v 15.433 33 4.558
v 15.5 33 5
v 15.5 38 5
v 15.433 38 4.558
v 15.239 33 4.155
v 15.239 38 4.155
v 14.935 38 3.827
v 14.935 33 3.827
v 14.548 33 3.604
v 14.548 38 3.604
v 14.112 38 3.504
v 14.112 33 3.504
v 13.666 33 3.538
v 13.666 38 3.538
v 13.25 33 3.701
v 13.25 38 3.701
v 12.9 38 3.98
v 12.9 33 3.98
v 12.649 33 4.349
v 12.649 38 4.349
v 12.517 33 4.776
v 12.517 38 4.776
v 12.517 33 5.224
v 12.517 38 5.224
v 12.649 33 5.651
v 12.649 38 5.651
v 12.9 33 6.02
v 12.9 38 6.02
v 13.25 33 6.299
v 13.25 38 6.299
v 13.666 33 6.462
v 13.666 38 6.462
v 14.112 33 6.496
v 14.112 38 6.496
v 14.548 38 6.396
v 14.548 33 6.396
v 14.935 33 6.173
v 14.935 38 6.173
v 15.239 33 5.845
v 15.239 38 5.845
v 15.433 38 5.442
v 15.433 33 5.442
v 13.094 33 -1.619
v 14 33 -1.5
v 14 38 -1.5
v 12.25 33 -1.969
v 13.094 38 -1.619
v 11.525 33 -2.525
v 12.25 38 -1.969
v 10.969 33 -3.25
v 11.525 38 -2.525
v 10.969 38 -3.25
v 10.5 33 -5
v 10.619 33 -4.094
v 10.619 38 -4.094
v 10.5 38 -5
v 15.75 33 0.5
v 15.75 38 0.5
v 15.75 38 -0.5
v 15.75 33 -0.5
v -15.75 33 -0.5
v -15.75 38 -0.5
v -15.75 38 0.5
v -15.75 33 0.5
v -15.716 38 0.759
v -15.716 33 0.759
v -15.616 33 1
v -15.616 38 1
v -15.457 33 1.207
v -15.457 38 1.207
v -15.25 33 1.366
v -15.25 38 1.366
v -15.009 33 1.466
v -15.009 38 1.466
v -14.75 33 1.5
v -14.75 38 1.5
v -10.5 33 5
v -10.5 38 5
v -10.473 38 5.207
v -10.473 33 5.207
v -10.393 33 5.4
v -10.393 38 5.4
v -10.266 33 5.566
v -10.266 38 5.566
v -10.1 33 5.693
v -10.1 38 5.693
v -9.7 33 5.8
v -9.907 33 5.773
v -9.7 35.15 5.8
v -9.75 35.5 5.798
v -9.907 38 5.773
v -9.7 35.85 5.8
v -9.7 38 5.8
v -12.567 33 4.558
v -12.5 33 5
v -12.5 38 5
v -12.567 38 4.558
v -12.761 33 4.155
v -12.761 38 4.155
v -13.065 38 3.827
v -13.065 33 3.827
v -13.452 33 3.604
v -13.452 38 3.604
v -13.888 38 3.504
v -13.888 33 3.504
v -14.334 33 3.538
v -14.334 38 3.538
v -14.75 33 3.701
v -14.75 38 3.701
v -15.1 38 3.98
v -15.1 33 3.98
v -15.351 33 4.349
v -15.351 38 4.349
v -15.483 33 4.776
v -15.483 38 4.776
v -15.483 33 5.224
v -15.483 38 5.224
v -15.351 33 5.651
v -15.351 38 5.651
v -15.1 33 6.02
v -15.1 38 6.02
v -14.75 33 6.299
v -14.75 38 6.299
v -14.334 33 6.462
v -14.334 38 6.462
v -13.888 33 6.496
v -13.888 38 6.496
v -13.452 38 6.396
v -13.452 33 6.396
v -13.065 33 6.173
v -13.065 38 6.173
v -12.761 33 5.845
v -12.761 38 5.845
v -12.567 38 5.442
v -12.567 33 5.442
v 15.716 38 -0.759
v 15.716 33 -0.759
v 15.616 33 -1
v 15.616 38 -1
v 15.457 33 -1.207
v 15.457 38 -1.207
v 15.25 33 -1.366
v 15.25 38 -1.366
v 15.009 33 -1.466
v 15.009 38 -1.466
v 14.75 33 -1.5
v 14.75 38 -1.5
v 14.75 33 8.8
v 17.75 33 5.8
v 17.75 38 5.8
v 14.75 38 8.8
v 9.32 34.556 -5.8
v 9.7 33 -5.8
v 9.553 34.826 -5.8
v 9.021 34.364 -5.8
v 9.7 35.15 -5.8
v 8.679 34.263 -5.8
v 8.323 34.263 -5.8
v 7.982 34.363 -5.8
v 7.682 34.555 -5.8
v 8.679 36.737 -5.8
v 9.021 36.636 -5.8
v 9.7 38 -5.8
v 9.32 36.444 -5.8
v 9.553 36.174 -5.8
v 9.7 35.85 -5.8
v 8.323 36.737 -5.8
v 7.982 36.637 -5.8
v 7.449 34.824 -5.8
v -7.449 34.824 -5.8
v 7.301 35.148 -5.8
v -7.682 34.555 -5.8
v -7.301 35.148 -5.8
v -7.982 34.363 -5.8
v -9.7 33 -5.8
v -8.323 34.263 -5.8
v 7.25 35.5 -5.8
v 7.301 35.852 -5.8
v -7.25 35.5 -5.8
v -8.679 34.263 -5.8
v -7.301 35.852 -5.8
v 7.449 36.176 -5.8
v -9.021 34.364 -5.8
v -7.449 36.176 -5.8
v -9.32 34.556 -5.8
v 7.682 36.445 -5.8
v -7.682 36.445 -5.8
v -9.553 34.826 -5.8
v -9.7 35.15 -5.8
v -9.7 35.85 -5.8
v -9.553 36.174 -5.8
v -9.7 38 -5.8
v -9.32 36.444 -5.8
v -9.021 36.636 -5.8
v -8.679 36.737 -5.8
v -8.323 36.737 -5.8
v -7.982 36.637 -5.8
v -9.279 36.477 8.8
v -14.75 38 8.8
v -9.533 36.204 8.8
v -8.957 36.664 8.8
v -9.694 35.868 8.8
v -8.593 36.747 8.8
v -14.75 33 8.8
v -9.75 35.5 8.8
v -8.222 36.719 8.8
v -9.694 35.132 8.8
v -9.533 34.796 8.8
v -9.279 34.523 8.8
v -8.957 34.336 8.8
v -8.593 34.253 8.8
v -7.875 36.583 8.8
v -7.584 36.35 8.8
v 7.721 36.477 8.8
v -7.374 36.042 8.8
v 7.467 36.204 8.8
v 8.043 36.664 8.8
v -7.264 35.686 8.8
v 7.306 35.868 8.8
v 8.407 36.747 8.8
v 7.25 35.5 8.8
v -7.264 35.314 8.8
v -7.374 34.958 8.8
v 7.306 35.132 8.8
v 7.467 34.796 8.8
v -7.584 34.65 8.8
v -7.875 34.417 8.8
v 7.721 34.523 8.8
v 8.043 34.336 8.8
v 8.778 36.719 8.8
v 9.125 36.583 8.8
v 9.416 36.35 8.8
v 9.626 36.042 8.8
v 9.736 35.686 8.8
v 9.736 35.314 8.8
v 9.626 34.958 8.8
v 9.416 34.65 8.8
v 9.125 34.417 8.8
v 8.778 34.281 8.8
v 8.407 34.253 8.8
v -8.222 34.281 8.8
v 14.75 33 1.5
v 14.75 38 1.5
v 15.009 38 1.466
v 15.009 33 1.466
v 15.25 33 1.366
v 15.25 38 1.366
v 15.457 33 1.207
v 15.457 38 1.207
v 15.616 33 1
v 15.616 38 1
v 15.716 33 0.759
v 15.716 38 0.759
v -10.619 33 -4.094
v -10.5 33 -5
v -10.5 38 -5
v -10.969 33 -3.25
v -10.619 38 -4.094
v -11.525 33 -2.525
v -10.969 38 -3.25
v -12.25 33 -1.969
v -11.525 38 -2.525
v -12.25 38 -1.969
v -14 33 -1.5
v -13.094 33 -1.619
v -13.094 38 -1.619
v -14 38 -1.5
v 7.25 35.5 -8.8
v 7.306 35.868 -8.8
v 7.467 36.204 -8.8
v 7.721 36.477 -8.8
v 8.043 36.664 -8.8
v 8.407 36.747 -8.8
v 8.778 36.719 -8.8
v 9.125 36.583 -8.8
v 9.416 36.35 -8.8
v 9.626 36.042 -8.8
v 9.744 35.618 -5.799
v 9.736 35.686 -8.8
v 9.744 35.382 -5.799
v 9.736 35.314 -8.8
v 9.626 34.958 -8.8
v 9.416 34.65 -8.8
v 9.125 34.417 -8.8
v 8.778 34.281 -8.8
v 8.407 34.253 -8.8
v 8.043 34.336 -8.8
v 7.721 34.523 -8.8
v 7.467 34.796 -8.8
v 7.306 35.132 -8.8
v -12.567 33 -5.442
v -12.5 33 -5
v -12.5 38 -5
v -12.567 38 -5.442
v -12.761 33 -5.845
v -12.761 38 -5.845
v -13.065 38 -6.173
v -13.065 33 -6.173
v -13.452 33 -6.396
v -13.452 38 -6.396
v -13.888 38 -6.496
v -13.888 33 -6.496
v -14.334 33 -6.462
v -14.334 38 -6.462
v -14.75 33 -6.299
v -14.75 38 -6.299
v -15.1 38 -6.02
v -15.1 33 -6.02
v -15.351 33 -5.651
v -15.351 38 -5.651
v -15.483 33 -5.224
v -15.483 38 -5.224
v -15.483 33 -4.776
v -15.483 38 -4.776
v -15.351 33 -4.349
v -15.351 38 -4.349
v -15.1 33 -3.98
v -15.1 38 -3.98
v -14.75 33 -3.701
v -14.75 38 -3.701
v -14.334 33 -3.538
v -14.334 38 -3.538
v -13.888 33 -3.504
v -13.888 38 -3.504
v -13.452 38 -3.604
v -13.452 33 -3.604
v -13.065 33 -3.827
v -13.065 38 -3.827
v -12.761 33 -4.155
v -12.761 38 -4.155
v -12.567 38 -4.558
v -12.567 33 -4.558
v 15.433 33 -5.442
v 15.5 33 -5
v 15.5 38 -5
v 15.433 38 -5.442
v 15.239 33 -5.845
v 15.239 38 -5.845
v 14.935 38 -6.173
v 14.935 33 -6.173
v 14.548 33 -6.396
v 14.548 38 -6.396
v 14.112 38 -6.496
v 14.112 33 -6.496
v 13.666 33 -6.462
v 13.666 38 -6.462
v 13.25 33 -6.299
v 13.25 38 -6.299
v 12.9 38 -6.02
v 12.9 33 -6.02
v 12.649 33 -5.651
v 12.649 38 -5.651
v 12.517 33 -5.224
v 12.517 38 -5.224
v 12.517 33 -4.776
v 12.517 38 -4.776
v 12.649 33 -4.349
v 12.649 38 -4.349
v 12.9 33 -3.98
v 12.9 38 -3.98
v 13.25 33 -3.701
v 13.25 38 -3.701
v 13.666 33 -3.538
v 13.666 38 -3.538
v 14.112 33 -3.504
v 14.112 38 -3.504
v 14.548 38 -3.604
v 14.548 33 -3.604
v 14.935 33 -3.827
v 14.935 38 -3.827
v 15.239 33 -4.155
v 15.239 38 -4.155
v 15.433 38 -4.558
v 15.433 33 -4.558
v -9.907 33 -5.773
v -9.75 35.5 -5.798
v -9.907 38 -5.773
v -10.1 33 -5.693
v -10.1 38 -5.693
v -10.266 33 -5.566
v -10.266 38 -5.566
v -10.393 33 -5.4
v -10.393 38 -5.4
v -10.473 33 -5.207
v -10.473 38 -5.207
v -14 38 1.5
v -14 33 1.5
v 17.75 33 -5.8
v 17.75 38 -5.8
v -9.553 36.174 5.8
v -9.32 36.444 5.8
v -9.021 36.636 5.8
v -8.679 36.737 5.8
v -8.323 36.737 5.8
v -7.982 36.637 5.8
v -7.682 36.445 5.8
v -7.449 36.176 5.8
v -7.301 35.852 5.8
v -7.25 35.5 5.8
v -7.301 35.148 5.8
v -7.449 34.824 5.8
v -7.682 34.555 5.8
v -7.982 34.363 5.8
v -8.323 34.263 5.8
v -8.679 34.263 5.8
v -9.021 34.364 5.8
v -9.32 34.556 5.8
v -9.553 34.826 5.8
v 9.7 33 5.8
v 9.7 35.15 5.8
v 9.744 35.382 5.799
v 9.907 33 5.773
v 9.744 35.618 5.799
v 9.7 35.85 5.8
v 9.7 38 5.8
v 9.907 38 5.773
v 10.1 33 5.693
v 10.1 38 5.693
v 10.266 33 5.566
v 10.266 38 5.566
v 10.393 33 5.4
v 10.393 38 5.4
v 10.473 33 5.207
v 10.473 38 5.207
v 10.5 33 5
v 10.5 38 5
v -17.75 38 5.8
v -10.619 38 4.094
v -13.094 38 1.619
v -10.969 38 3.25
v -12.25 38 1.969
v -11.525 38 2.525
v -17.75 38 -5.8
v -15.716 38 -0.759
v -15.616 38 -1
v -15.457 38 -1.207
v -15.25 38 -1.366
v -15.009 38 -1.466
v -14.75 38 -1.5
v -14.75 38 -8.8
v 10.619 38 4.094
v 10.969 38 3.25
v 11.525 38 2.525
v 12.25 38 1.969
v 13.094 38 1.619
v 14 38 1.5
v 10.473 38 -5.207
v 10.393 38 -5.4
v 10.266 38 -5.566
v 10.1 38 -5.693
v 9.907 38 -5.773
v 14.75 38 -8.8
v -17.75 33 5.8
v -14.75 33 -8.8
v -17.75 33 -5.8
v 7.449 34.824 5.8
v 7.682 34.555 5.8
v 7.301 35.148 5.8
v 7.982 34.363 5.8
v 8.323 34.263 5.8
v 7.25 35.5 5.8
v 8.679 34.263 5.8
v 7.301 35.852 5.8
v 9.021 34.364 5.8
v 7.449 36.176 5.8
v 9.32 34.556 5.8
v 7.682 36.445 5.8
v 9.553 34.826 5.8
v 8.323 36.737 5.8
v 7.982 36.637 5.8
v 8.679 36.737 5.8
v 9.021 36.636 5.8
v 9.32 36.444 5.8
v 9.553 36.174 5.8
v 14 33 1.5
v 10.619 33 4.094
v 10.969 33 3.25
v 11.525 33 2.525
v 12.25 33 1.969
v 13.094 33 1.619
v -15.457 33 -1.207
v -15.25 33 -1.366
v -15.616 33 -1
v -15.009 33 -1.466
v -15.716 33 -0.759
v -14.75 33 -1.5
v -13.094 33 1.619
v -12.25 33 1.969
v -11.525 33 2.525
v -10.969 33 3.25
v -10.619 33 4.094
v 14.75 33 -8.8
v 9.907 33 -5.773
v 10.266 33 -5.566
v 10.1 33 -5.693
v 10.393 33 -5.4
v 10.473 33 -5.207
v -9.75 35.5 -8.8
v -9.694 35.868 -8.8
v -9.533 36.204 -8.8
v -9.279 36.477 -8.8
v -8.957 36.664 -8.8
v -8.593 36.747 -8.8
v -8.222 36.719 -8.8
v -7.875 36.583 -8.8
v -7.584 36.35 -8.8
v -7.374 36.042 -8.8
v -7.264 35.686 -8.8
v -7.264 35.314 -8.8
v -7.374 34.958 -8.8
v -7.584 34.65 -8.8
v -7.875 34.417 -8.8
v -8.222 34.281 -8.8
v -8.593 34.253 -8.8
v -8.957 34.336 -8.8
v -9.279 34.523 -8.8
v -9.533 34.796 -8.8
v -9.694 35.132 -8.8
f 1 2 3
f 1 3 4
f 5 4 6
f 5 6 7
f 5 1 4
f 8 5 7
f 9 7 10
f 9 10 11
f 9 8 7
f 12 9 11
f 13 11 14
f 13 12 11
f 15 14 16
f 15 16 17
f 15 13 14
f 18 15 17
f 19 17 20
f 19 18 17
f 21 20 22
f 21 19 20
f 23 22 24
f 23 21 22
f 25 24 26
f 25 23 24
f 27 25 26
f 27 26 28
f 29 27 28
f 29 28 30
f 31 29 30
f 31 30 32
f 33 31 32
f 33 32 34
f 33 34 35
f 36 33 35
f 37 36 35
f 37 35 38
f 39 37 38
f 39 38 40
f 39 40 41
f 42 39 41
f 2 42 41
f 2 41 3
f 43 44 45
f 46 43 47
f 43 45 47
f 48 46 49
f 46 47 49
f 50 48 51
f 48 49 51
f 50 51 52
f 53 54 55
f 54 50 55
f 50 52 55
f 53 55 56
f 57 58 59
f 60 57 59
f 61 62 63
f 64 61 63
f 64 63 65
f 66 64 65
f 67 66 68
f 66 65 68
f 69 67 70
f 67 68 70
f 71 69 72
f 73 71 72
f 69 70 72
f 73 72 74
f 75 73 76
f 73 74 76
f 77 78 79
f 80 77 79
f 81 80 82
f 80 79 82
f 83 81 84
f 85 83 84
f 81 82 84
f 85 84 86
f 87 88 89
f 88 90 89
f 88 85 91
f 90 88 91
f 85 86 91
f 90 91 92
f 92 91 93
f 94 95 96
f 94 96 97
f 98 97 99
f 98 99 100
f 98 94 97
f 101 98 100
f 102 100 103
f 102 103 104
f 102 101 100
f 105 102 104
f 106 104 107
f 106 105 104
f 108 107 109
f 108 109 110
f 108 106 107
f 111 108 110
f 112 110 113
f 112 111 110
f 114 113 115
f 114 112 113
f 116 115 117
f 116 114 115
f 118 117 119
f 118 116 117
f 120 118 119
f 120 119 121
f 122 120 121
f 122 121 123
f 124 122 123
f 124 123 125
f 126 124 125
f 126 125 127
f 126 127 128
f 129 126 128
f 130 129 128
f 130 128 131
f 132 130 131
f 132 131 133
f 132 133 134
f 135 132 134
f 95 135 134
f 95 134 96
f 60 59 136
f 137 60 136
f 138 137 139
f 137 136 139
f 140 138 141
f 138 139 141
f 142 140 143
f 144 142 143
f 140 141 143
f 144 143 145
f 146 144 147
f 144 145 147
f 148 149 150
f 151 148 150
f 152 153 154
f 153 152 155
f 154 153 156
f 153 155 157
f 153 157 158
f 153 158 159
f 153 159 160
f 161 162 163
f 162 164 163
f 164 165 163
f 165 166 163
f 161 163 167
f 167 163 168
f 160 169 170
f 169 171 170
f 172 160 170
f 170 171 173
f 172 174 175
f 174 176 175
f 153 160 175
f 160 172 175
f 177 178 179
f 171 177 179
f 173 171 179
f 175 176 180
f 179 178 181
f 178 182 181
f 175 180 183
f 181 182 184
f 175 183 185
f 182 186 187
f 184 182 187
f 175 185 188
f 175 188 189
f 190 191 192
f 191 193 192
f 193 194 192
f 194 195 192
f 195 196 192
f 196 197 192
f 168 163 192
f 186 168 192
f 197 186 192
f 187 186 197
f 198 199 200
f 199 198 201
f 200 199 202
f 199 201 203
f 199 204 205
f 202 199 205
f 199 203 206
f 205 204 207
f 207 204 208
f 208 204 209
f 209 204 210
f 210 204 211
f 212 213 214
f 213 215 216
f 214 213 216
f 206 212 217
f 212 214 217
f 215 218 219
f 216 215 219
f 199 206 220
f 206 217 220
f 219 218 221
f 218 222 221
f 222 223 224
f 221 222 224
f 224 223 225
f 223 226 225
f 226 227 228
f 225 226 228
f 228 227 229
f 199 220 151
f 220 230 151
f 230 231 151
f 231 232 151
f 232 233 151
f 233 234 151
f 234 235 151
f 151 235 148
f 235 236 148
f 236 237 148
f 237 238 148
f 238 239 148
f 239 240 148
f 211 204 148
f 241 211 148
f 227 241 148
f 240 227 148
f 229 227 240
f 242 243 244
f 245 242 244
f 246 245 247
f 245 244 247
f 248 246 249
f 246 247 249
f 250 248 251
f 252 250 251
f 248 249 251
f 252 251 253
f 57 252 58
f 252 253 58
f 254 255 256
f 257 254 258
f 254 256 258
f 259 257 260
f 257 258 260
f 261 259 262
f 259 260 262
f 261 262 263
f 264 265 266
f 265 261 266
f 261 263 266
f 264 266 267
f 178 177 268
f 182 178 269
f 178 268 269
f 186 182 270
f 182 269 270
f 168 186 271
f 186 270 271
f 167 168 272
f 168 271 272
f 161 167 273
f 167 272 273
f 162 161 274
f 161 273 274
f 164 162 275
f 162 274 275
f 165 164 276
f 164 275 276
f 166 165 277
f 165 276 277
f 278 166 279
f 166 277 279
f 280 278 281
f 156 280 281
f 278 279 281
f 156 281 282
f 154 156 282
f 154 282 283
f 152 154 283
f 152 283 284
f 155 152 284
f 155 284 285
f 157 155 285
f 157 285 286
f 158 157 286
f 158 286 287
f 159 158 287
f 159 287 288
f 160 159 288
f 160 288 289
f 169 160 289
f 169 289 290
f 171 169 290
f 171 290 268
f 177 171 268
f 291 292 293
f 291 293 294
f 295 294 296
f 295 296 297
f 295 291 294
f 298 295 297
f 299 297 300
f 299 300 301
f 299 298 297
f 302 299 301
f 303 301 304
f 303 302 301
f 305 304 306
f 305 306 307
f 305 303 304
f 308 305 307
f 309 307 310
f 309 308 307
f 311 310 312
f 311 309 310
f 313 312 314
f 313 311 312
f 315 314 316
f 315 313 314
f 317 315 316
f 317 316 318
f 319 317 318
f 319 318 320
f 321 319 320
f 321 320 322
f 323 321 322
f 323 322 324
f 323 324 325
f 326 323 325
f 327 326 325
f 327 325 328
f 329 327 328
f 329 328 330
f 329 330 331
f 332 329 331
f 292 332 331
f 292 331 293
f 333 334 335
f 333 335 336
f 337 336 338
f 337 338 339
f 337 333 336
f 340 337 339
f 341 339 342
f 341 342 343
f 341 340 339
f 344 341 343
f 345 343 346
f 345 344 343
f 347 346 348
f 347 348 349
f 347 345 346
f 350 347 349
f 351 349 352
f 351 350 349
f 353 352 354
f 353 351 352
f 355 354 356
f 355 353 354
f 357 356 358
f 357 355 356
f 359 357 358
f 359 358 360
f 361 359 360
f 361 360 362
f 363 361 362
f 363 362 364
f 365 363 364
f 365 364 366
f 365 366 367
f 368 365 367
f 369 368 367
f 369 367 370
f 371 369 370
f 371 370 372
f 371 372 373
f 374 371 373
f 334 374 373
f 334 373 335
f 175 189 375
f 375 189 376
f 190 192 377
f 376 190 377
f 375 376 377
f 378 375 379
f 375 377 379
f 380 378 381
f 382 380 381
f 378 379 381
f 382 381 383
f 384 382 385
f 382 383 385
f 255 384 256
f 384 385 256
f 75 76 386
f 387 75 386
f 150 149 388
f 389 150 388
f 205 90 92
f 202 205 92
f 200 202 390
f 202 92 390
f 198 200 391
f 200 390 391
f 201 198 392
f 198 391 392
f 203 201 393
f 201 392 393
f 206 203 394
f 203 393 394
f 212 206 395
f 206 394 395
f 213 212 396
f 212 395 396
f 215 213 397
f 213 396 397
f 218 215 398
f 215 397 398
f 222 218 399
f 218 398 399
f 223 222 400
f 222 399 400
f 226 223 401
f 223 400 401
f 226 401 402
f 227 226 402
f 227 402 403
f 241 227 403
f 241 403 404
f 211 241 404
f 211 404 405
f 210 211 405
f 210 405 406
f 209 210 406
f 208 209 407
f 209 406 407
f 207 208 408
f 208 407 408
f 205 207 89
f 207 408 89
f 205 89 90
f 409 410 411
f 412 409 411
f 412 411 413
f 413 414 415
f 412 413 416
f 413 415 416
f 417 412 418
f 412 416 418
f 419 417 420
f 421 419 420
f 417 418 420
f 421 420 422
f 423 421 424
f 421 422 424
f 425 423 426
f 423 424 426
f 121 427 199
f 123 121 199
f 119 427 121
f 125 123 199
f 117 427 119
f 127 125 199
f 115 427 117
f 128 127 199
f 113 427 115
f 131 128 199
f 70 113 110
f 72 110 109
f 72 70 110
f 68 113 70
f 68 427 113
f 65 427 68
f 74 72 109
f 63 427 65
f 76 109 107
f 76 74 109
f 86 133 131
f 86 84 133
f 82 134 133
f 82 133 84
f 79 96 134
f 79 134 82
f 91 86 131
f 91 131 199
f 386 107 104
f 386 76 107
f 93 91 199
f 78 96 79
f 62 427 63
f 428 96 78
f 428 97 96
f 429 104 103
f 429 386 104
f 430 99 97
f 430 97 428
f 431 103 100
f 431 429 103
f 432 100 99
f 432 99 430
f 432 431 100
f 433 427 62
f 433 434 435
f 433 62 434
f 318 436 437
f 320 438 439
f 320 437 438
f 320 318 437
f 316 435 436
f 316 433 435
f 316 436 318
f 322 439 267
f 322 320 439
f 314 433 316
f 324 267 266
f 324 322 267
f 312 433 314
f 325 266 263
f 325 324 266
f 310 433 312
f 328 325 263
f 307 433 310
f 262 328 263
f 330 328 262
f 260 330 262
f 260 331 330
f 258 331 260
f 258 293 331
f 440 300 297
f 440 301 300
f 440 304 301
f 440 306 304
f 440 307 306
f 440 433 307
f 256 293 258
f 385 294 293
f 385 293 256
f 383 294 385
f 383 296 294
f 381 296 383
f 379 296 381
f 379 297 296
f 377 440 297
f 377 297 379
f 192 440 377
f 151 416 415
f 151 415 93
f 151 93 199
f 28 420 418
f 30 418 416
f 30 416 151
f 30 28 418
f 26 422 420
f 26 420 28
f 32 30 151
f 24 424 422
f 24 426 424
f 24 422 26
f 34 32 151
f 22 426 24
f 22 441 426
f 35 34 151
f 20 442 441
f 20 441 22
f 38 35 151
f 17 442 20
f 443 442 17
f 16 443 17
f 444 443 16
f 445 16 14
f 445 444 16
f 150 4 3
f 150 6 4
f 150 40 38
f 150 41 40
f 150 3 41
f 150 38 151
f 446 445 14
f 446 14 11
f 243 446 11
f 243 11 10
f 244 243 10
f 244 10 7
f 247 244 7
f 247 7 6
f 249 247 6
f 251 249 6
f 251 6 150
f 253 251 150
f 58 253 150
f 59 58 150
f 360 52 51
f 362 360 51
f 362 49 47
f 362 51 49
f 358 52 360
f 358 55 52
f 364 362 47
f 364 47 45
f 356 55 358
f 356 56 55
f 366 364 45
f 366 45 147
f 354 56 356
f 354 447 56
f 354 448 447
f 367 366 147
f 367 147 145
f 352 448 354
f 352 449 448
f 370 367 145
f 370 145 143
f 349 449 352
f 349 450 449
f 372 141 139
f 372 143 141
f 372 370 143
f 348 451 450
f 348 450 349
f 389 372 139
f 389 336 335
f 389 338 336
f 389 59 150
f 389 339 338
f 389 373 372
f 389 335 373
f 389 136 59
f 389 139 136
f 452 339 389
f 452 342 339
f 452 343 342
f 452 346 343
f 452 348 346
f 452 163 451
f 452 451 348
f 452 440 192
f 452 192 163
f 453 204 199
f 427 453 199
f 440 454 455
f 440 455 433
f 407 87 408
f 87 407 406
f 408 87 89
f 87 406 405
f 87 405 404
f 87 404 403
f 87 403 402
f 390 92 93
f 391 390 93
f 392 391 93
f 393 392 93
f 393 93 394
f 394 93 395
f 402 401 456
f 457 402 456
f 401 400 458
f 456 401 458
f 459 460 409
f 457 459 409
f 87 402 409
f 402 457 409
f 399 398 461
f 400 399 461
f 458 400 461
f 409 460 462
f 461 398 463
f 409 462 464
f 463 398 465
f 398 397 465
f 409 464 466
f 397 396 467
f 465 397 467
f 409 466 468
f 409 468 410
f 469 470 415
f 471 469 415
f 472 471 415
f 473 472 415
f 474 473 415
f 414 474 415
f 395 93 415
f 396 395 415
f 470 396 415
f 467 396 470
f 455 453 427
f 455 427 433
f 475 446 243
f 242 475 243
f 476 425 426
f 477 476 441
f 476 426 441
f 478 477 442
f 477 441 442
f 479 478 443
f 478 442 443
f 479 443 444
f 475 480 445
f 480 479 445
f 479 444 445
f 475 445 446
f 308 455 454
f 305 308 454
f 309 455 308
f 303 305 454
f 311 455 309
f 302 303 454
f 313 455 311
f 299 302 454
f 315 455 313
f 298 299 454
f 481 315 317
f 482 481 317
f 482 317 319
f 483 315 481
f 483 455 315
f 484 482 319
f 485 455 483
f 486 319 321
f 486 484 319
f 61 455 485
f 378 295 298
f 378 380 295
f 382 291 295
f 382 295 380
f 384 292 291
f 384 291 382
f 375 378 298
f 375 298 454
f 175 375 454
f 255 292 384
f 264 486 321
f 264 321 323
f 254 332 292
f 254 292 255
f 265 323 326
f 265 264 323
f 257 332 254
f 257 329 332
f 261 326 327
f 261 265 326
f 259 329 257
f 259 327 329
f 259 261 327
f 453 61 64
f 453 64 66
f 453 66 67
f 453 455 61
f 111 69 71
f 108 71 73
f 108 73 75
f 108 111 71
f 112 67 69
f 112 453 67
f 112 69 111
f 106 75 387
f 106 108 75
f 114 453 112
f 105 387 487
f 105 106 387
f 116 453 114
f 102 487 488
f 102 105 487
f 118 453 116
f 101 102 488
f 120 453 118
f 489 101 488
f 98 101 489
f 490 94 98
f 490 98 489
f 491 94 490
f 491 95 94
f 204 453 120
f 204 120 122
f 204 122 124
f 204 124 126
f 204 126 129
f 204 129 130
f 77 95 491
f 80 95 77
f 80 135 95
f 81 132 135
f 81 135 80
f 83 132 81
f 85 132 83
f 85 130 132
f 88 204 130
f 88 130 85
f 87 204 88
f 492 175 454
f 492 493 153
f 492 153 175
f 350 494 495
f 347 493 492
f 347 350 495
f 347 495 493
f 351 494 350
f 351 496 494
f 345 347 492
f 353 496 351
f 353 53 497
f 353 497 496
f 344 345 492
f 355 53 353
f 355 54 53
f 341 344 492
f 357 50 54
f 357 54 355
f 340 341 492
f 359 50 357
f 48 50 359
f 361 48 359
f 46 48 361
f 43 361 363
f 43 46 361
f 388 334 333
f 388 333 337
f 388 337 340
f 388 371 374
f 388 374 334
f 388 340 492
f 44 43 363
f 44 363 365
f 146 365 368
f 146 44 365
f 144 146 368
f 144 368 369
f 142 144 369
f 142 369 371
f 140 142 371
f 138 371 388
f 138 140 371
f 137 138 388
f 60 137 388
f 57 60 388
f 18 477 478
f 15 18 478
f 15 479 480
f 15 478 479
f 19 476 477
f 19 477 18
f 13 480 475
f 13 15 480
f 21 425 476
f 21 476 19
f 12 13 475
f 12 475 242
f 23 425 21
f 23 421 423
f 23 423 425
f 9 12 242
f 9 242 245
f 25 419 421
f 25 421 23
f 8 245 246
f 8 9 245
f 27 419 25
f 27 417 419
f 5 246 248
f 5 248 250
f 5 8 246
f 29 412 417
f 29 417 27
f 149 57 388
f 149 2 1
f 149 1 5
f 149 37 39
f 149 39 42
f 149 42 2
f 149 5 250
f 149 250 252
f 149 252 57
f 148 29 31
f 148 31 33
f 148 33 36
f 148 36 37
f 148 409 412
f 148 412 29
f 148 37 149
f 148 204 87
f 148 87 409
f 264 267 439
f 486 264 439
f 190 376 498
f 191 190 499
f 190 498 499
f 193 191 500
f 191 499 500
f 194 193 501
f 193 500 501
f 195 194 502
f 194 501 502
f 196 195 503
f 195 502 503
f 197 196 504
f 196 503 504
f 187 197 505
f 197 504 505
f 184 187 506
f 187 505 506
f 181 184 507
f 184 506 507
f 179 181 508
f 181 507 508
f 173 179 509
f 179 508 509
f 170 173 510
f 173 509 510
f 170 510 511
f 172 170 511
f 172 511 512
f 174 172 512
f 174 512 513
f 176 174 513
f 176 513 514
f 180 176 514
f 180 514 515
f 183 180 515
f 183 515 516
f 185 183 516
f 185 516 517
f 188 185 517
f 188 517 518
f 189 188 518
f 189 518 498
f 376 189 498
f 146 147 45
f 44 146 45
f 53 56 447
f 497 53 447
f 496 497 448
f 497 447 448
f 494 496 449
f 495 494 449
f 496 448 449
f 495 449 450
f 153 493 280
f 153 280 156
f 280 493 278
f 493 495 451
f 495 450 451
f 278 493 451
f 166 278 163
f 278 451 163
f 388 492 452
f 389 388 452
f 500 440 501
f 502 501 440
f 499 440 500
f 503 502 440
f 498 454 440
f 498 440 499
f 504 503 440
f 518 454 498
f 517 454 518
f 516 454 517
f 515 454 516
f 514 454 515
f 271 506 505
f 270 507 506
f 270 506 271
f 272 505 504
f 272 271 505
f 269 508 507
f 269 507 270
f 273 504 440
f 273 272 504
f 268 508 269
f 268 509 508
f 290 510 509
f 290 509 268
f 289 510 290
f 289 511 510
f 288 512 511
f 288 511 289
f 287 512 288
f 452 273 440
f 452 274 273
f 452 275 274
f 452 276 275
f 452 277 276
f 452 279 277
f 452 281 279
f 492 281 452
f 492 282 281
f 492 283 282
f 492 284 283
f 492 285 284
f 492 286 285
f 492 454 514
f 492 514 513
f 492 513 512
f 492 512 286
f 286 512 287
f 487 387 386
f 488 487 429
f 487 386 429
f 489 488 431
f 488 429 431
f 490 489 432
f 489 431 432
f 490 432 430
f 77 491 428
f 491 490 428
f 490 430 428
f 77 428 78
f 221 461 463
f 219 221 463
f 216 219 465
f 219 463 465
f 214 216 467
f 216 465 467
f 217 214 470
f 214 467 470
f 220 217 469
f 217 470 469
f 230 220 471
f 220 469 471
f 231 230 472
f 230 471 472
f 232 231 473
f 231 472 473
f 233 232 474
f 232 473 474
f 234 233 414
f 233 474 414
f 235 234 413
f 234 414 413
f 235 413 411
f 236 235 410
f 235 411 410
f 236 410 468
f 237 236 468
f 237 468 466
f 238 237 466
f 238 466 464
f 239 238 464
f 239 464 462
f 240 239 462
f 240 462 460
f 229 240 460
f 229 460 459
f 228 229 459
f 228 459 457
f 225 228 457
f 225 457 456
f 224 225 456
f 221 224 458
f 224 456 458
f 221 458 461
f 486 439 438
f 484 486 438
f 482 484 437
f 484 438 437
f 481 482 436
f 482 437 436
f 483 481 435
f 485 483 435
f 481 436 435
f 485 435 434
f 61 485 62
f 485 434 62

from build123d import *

# Parameters (mm, degrees)
SKETCH_1_W          = 35.5
SKETCH_1_H          = 17.6
SKETCH_1_R          = 1.5
EXTRUDE_1_DEPTH     = 38
CUT_EXTRUDE_1_DEPTH = 39
SKETCH_4_W          = 29.5
SKETCH_4_H          = 28
CUT_EXTRUDE_3_DEPTH = 18.6
SKETCH_5_W          = 35.5
SKETCH_5_H          = 33
CUT_EXTRUDE_4_DEPTH = 18.6
CHAMFER_1_SIZE      = 3
SKETCH_7_R          = 1.25
CUT_EXTRUDE_5_DEPTH = 18.6


with BuildPart() as part:
    # 草图1 → 凸台-拉伸1 (new body)
    with BuildSketch(Plane(origin=(0, 0, 0), x_dir=(1, 0, 0), z_dir=(0, 1, 0))):
        Rectangle(SKETCH_1_W, SKETCH_1_H)
        with Locations((-14, 5)):
            Circle(SKETCH_1_R, mode=Mode.SUBTRACT)
        with Locations((-14, -5)):
            Circle(SKETCH_1_R, mode=Mode.SUBTRACT)
        with Locations((14, -5)):
            Circle(SKETCH_1_R, mode=Mode.SUBTRACT)
        with Locations((14, 5)):
            Circle(SKETCH_1_R, mode=Mode.SUBTRACT)
    extrude(amount=EXTRUDE_1_DEPTH)

    # 草图2 → 切除-拉伸1 (cut, through all)
    with BuildSketch(Plane(origin=(0, 38, 0), x_dir=(1, 0, 0), z_dir=(0, 1, 0))):
        with BuildLine():
            Line((9.7, 5.8), (-9.7, 5.8))
            ThreePointArc((-9.7, 5.8), (-10.265685425, 5.565685425), (-10.5, 5))
            ThreePointArc((-10.5, 5), (-11.525126266, 2.525126266), (-14, 1.5))
            Line((-14, 1.5), (-14.75, 1.5))
            ThreePointArc((-14.75, 1.5), (-15.457106781, 1.207106781), (-15.75, 0.5))
            Line((-15.75, 0.5), (-15.75, -0.5))
            ThreePointArc((-15.75, -0.5), (-15.457106781, -1.207106781), (-14.75, -1.5))
            Line((-14.75, -1.5), (-14, -1.5))
            ThreePointArc((-14, -1.5), (-11.525126266, -2.525126266), (-10.5, -5))
            ThreePointArc((-10.5, -5), (-10.265685425, -5.565685425), (-9.7, -5.8))
            Line((-9.7, -5.8), (9.7, -5.8))
            ThreePointArc((9.7, -5.8), (10.265685425, -5.565685425), (10.5, -5))
            ThreePointArc((10.5, -5), (11.525126266, -2.525126266), (14, -1.5))
            Line((14, -1.5), (14.75, -1.5))
            ThreePointArc((14.75, -1.5), (15.457106781, -1.207106781), (15.75, -0.5))
            Line((15.75, -0.5), (15.75, 0.5))
            ThreePointArc((15.75, 0.5), (15.457106781, 1.207106781), (14.75, 1.5))
            Line((14.75, 1.5), (14, 1.5))
            ThreePointArc((14, 1.5), (11.525126266, 2.525126266), (10.5, 5))
            ThreePointArc((10.5, 5), (10.265685425, 5.565685425), (9.7, 5.8))
        make_face()
    extrude(amount=-CUT_EXTRUDE_1_DEPTH, mode=Mode.SUBTRACT)

    # 草图4 → 切除-拉伸3 (cut, through all)
    with BuildSketch(Plane.XY.offset(8.8)):
        with Locations((0, 19)):
            Rectangle(SKETCH_4_W, SKETCH_4_H)
    extrude(amount=-CUT_EXTRUDE_3_DEPTH, mode=Mode.SUBTRACT)

    # 草图5 → 切除-拉伸4 (cut, through all)
    with BuildSketch(Plane.XY.offset(8.8)):
        with Locations((0, 16.5)):
            Rectangle(SKETCH_5_W, SKETCH_5_H)
    extrude(amount=-CUT_EXTRUDE_4_DEPTH, mode=Mode.SUBTRACT)

    # 倒角1
    chamfer_1_edges = [part.edges().sort_by_distance(p)[0] for p in [
        (17.75, 35.5, 8.8),
        (-17.75, 35.5, 8.8),
        (-17.75, 35.5, -8.8),
        (17.75, 35.5, -8.8),
    ]]
    chamfer(chamfer_1_edges, length=CHAMFER_1_SIZE)

    # 草图7 → 切除-拉伸5 (cut, through all)
    with BuildSketch(Plane(origin=(0, 0, -8.8), x_dir=(-1, 0, 0), z_dir=(0, 0, -1))):
        with Locations((-8.5, 35.5)):
            Circle(SKETCH_7_R)
        with Locations((8.5, 35.5)):
            Circle(SKETCH_7_R)
    extrude(amount=-CUT_EXTRUDE_5_DEPTH, mode=Mode.SUBTRACT)


solid = part.part
